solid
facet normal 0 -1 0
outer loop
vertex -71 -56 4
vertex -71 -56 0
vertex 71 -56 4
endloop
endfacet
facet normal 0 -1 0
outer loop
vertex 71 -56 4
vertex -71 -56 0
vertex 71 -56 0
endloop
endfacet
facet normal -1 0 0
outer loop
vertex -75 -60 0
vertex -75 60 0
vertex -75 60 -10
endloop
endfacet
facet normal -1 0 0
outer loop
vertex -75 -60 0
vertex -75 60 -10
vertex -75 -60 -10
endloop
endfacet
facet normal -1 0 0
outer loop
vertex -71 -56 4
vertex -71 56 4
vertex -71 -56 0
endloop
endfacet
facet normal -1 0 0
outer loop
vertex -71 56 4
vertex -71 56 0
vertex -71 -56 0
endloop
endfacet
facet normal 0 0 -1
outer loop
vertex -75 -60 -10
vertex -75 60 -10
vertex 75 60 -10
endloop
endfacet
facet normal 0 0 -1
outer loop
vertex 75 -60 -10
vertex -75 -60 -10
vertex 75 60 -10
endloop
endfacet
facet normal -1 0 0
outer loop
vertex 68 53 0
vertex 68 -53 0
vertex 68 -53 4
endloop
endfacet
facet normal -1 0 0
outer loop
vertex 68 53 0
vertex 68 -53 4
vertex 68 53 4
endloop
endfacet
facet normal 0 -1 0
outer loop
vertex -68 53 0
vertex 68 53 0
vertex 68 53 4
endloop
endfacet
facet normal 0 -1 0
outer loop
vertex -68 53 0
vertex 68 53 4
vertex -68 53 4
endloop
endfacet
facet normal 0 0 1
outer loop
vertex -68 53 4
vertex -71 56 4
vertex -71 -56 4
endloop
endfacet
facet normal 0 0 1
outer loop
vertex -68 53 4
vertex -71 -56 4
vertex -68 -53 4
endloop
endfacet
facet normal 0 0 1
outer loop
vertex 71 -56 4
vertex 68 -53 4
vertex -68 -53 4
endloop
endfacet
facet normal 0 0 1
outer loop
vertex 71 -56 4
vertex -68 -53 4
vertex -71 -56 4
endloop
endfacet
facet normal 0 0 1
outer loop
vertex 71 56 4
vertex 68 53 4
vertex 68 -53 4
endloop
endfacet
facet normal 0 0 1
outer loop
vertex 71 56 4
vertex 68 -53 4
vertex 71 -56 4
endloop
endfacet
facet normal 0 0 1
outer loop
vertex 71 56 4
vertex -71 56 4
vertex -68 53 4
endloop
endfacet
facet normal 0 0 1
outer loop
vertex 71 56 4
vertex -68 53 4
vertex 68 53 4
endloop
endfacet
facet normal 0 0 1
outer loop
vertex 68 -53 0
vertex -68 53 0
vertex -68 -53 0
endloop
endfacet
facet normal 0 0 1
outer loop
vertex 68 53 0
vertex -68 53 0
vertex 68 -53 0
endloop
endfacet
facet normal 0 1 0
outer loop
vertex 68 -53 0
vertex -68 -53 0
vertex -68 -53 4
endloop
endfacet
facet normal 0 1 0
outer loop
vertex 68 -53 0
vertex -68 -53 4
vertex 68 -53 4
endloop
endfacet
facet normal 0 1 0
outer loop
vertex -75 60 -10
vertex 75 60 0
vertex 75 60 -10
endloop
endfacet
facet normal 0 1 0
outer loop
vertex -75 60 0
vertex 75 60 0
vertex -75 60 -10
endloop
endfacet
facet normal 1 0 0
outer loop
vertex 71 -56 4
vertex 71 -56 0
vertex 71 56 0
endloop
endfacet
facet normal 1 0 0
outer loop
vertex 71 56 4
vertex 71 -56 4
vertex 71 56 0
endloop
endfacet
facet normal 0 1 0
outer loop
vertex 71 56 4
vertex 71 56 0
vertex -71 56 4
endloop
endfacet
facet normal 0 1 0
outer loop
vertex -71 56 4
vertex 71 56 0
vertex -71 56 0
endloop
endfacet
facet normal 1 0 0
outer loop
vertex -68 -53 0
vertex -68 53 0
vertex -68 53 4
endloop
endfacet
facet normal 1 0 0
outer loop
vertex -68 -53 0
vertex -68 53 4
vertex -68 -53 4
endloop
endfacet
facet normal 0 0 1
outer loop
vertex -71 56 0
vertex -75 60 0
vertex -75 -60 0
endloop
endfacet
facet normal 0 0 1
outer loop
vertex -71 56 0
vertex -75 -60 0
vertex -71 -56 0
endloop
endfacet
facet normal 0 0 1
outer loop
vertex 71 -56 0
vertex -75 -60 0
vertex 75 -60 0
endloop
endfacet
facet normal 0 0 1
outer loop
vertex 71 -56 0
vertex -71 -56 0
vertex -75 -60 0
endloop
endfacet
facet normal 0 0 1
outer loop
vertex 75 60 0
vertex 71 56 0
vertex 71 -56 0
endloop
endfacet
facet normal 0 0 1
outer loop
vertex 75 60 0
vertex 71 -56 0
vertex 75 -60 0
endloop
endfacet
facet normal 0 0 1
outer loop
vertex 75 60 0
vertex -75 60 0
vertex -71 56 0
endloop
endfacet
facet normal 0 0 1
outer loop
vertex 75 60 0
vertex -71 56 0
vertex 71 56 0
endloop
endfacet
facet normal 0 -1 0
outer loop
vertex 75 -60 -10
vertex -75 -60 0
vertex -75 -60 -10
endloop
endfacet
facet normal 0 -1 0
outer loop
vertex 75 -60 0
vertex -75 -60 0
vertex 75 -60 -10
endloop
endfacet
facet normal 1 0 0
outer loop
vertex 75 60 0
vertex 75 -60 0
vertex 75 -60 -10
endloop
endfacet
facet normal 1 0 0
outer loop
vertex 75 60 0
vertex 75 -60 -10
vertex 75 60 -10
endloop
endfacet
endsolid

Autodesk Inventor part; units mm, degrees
ref_plane "YZ Plane" through (0, 0, 0) normal (1, 0, 0) x (0, 1, 0)
ref_plane "XZ Plane" through (0, 0, 0) normal (0, 1, 0) x (-1, 0, 0)
ref_plane "XY Plane" through (0, 0, 0) normal (0, 0, 1) x (1, 0, 0)
sketch "Sketch1" plane through (0, 0, 0) normal (0, 0, 1) x (1, 0, 0)
  line L0 (-75, -60) -> (75, -60)
  line L1 (75, -60) -> (75, 60)
  line L2 (75, 60) -> (-75, 60)
  line L3 (-75, 60) -> (-75, -60)
  line L4 (-75, -60) -> (75, 60) construction
  line L5 (75, -60) -> (-75, 60) construction
  point P0 (0, 0)
  dimension "d0" = 150
  dimension "d1" = 120
extrude "Extrusion1" add sketch "Sketch1" against normal blind 10
sketch "Sketch2" plane through (0, 0, 0) normal (0, 0, 1) x (1, 0, 0)
  line L0 (-71, -56) -> (71, -56)
  line L1 (71, -56) -> (71, 56)
  line L2 (71, 56) -> (-71, 56)
  line L3 (-71, 56) -> (-71, -56)
  line L4 (-71, -56) -> (71, 56) construction
  line L5 (71, -56) -> (-71, 56) construction
  line L6 (75, 60) -> (-75, 60) projected
  line L7 (-75, 60) -> (-75, -60) projected
  line L8 (-68, -53) -> (68, -53)
  line L9 (68, -53) -> (68, 53)
  line L10 (68, 53) -> (-68, 53)
  line L11 (-68, 53) -> (-68, -53)
  line L12 (-68, -53) -> (68, 53) construction
  line L13 (68, -53) -> (-68, 53) construction
  point P0 (0, 0)
  dimension "d4" = 4
  dimension "d5" = 4
  dimension "d6" = 3
  dimension "d7" = 3
extrude "Extrusion2" add sketch "Sketch2" along normal blind 4
properties part number "Pi Case Top V 01" material "ABS Plastic"
